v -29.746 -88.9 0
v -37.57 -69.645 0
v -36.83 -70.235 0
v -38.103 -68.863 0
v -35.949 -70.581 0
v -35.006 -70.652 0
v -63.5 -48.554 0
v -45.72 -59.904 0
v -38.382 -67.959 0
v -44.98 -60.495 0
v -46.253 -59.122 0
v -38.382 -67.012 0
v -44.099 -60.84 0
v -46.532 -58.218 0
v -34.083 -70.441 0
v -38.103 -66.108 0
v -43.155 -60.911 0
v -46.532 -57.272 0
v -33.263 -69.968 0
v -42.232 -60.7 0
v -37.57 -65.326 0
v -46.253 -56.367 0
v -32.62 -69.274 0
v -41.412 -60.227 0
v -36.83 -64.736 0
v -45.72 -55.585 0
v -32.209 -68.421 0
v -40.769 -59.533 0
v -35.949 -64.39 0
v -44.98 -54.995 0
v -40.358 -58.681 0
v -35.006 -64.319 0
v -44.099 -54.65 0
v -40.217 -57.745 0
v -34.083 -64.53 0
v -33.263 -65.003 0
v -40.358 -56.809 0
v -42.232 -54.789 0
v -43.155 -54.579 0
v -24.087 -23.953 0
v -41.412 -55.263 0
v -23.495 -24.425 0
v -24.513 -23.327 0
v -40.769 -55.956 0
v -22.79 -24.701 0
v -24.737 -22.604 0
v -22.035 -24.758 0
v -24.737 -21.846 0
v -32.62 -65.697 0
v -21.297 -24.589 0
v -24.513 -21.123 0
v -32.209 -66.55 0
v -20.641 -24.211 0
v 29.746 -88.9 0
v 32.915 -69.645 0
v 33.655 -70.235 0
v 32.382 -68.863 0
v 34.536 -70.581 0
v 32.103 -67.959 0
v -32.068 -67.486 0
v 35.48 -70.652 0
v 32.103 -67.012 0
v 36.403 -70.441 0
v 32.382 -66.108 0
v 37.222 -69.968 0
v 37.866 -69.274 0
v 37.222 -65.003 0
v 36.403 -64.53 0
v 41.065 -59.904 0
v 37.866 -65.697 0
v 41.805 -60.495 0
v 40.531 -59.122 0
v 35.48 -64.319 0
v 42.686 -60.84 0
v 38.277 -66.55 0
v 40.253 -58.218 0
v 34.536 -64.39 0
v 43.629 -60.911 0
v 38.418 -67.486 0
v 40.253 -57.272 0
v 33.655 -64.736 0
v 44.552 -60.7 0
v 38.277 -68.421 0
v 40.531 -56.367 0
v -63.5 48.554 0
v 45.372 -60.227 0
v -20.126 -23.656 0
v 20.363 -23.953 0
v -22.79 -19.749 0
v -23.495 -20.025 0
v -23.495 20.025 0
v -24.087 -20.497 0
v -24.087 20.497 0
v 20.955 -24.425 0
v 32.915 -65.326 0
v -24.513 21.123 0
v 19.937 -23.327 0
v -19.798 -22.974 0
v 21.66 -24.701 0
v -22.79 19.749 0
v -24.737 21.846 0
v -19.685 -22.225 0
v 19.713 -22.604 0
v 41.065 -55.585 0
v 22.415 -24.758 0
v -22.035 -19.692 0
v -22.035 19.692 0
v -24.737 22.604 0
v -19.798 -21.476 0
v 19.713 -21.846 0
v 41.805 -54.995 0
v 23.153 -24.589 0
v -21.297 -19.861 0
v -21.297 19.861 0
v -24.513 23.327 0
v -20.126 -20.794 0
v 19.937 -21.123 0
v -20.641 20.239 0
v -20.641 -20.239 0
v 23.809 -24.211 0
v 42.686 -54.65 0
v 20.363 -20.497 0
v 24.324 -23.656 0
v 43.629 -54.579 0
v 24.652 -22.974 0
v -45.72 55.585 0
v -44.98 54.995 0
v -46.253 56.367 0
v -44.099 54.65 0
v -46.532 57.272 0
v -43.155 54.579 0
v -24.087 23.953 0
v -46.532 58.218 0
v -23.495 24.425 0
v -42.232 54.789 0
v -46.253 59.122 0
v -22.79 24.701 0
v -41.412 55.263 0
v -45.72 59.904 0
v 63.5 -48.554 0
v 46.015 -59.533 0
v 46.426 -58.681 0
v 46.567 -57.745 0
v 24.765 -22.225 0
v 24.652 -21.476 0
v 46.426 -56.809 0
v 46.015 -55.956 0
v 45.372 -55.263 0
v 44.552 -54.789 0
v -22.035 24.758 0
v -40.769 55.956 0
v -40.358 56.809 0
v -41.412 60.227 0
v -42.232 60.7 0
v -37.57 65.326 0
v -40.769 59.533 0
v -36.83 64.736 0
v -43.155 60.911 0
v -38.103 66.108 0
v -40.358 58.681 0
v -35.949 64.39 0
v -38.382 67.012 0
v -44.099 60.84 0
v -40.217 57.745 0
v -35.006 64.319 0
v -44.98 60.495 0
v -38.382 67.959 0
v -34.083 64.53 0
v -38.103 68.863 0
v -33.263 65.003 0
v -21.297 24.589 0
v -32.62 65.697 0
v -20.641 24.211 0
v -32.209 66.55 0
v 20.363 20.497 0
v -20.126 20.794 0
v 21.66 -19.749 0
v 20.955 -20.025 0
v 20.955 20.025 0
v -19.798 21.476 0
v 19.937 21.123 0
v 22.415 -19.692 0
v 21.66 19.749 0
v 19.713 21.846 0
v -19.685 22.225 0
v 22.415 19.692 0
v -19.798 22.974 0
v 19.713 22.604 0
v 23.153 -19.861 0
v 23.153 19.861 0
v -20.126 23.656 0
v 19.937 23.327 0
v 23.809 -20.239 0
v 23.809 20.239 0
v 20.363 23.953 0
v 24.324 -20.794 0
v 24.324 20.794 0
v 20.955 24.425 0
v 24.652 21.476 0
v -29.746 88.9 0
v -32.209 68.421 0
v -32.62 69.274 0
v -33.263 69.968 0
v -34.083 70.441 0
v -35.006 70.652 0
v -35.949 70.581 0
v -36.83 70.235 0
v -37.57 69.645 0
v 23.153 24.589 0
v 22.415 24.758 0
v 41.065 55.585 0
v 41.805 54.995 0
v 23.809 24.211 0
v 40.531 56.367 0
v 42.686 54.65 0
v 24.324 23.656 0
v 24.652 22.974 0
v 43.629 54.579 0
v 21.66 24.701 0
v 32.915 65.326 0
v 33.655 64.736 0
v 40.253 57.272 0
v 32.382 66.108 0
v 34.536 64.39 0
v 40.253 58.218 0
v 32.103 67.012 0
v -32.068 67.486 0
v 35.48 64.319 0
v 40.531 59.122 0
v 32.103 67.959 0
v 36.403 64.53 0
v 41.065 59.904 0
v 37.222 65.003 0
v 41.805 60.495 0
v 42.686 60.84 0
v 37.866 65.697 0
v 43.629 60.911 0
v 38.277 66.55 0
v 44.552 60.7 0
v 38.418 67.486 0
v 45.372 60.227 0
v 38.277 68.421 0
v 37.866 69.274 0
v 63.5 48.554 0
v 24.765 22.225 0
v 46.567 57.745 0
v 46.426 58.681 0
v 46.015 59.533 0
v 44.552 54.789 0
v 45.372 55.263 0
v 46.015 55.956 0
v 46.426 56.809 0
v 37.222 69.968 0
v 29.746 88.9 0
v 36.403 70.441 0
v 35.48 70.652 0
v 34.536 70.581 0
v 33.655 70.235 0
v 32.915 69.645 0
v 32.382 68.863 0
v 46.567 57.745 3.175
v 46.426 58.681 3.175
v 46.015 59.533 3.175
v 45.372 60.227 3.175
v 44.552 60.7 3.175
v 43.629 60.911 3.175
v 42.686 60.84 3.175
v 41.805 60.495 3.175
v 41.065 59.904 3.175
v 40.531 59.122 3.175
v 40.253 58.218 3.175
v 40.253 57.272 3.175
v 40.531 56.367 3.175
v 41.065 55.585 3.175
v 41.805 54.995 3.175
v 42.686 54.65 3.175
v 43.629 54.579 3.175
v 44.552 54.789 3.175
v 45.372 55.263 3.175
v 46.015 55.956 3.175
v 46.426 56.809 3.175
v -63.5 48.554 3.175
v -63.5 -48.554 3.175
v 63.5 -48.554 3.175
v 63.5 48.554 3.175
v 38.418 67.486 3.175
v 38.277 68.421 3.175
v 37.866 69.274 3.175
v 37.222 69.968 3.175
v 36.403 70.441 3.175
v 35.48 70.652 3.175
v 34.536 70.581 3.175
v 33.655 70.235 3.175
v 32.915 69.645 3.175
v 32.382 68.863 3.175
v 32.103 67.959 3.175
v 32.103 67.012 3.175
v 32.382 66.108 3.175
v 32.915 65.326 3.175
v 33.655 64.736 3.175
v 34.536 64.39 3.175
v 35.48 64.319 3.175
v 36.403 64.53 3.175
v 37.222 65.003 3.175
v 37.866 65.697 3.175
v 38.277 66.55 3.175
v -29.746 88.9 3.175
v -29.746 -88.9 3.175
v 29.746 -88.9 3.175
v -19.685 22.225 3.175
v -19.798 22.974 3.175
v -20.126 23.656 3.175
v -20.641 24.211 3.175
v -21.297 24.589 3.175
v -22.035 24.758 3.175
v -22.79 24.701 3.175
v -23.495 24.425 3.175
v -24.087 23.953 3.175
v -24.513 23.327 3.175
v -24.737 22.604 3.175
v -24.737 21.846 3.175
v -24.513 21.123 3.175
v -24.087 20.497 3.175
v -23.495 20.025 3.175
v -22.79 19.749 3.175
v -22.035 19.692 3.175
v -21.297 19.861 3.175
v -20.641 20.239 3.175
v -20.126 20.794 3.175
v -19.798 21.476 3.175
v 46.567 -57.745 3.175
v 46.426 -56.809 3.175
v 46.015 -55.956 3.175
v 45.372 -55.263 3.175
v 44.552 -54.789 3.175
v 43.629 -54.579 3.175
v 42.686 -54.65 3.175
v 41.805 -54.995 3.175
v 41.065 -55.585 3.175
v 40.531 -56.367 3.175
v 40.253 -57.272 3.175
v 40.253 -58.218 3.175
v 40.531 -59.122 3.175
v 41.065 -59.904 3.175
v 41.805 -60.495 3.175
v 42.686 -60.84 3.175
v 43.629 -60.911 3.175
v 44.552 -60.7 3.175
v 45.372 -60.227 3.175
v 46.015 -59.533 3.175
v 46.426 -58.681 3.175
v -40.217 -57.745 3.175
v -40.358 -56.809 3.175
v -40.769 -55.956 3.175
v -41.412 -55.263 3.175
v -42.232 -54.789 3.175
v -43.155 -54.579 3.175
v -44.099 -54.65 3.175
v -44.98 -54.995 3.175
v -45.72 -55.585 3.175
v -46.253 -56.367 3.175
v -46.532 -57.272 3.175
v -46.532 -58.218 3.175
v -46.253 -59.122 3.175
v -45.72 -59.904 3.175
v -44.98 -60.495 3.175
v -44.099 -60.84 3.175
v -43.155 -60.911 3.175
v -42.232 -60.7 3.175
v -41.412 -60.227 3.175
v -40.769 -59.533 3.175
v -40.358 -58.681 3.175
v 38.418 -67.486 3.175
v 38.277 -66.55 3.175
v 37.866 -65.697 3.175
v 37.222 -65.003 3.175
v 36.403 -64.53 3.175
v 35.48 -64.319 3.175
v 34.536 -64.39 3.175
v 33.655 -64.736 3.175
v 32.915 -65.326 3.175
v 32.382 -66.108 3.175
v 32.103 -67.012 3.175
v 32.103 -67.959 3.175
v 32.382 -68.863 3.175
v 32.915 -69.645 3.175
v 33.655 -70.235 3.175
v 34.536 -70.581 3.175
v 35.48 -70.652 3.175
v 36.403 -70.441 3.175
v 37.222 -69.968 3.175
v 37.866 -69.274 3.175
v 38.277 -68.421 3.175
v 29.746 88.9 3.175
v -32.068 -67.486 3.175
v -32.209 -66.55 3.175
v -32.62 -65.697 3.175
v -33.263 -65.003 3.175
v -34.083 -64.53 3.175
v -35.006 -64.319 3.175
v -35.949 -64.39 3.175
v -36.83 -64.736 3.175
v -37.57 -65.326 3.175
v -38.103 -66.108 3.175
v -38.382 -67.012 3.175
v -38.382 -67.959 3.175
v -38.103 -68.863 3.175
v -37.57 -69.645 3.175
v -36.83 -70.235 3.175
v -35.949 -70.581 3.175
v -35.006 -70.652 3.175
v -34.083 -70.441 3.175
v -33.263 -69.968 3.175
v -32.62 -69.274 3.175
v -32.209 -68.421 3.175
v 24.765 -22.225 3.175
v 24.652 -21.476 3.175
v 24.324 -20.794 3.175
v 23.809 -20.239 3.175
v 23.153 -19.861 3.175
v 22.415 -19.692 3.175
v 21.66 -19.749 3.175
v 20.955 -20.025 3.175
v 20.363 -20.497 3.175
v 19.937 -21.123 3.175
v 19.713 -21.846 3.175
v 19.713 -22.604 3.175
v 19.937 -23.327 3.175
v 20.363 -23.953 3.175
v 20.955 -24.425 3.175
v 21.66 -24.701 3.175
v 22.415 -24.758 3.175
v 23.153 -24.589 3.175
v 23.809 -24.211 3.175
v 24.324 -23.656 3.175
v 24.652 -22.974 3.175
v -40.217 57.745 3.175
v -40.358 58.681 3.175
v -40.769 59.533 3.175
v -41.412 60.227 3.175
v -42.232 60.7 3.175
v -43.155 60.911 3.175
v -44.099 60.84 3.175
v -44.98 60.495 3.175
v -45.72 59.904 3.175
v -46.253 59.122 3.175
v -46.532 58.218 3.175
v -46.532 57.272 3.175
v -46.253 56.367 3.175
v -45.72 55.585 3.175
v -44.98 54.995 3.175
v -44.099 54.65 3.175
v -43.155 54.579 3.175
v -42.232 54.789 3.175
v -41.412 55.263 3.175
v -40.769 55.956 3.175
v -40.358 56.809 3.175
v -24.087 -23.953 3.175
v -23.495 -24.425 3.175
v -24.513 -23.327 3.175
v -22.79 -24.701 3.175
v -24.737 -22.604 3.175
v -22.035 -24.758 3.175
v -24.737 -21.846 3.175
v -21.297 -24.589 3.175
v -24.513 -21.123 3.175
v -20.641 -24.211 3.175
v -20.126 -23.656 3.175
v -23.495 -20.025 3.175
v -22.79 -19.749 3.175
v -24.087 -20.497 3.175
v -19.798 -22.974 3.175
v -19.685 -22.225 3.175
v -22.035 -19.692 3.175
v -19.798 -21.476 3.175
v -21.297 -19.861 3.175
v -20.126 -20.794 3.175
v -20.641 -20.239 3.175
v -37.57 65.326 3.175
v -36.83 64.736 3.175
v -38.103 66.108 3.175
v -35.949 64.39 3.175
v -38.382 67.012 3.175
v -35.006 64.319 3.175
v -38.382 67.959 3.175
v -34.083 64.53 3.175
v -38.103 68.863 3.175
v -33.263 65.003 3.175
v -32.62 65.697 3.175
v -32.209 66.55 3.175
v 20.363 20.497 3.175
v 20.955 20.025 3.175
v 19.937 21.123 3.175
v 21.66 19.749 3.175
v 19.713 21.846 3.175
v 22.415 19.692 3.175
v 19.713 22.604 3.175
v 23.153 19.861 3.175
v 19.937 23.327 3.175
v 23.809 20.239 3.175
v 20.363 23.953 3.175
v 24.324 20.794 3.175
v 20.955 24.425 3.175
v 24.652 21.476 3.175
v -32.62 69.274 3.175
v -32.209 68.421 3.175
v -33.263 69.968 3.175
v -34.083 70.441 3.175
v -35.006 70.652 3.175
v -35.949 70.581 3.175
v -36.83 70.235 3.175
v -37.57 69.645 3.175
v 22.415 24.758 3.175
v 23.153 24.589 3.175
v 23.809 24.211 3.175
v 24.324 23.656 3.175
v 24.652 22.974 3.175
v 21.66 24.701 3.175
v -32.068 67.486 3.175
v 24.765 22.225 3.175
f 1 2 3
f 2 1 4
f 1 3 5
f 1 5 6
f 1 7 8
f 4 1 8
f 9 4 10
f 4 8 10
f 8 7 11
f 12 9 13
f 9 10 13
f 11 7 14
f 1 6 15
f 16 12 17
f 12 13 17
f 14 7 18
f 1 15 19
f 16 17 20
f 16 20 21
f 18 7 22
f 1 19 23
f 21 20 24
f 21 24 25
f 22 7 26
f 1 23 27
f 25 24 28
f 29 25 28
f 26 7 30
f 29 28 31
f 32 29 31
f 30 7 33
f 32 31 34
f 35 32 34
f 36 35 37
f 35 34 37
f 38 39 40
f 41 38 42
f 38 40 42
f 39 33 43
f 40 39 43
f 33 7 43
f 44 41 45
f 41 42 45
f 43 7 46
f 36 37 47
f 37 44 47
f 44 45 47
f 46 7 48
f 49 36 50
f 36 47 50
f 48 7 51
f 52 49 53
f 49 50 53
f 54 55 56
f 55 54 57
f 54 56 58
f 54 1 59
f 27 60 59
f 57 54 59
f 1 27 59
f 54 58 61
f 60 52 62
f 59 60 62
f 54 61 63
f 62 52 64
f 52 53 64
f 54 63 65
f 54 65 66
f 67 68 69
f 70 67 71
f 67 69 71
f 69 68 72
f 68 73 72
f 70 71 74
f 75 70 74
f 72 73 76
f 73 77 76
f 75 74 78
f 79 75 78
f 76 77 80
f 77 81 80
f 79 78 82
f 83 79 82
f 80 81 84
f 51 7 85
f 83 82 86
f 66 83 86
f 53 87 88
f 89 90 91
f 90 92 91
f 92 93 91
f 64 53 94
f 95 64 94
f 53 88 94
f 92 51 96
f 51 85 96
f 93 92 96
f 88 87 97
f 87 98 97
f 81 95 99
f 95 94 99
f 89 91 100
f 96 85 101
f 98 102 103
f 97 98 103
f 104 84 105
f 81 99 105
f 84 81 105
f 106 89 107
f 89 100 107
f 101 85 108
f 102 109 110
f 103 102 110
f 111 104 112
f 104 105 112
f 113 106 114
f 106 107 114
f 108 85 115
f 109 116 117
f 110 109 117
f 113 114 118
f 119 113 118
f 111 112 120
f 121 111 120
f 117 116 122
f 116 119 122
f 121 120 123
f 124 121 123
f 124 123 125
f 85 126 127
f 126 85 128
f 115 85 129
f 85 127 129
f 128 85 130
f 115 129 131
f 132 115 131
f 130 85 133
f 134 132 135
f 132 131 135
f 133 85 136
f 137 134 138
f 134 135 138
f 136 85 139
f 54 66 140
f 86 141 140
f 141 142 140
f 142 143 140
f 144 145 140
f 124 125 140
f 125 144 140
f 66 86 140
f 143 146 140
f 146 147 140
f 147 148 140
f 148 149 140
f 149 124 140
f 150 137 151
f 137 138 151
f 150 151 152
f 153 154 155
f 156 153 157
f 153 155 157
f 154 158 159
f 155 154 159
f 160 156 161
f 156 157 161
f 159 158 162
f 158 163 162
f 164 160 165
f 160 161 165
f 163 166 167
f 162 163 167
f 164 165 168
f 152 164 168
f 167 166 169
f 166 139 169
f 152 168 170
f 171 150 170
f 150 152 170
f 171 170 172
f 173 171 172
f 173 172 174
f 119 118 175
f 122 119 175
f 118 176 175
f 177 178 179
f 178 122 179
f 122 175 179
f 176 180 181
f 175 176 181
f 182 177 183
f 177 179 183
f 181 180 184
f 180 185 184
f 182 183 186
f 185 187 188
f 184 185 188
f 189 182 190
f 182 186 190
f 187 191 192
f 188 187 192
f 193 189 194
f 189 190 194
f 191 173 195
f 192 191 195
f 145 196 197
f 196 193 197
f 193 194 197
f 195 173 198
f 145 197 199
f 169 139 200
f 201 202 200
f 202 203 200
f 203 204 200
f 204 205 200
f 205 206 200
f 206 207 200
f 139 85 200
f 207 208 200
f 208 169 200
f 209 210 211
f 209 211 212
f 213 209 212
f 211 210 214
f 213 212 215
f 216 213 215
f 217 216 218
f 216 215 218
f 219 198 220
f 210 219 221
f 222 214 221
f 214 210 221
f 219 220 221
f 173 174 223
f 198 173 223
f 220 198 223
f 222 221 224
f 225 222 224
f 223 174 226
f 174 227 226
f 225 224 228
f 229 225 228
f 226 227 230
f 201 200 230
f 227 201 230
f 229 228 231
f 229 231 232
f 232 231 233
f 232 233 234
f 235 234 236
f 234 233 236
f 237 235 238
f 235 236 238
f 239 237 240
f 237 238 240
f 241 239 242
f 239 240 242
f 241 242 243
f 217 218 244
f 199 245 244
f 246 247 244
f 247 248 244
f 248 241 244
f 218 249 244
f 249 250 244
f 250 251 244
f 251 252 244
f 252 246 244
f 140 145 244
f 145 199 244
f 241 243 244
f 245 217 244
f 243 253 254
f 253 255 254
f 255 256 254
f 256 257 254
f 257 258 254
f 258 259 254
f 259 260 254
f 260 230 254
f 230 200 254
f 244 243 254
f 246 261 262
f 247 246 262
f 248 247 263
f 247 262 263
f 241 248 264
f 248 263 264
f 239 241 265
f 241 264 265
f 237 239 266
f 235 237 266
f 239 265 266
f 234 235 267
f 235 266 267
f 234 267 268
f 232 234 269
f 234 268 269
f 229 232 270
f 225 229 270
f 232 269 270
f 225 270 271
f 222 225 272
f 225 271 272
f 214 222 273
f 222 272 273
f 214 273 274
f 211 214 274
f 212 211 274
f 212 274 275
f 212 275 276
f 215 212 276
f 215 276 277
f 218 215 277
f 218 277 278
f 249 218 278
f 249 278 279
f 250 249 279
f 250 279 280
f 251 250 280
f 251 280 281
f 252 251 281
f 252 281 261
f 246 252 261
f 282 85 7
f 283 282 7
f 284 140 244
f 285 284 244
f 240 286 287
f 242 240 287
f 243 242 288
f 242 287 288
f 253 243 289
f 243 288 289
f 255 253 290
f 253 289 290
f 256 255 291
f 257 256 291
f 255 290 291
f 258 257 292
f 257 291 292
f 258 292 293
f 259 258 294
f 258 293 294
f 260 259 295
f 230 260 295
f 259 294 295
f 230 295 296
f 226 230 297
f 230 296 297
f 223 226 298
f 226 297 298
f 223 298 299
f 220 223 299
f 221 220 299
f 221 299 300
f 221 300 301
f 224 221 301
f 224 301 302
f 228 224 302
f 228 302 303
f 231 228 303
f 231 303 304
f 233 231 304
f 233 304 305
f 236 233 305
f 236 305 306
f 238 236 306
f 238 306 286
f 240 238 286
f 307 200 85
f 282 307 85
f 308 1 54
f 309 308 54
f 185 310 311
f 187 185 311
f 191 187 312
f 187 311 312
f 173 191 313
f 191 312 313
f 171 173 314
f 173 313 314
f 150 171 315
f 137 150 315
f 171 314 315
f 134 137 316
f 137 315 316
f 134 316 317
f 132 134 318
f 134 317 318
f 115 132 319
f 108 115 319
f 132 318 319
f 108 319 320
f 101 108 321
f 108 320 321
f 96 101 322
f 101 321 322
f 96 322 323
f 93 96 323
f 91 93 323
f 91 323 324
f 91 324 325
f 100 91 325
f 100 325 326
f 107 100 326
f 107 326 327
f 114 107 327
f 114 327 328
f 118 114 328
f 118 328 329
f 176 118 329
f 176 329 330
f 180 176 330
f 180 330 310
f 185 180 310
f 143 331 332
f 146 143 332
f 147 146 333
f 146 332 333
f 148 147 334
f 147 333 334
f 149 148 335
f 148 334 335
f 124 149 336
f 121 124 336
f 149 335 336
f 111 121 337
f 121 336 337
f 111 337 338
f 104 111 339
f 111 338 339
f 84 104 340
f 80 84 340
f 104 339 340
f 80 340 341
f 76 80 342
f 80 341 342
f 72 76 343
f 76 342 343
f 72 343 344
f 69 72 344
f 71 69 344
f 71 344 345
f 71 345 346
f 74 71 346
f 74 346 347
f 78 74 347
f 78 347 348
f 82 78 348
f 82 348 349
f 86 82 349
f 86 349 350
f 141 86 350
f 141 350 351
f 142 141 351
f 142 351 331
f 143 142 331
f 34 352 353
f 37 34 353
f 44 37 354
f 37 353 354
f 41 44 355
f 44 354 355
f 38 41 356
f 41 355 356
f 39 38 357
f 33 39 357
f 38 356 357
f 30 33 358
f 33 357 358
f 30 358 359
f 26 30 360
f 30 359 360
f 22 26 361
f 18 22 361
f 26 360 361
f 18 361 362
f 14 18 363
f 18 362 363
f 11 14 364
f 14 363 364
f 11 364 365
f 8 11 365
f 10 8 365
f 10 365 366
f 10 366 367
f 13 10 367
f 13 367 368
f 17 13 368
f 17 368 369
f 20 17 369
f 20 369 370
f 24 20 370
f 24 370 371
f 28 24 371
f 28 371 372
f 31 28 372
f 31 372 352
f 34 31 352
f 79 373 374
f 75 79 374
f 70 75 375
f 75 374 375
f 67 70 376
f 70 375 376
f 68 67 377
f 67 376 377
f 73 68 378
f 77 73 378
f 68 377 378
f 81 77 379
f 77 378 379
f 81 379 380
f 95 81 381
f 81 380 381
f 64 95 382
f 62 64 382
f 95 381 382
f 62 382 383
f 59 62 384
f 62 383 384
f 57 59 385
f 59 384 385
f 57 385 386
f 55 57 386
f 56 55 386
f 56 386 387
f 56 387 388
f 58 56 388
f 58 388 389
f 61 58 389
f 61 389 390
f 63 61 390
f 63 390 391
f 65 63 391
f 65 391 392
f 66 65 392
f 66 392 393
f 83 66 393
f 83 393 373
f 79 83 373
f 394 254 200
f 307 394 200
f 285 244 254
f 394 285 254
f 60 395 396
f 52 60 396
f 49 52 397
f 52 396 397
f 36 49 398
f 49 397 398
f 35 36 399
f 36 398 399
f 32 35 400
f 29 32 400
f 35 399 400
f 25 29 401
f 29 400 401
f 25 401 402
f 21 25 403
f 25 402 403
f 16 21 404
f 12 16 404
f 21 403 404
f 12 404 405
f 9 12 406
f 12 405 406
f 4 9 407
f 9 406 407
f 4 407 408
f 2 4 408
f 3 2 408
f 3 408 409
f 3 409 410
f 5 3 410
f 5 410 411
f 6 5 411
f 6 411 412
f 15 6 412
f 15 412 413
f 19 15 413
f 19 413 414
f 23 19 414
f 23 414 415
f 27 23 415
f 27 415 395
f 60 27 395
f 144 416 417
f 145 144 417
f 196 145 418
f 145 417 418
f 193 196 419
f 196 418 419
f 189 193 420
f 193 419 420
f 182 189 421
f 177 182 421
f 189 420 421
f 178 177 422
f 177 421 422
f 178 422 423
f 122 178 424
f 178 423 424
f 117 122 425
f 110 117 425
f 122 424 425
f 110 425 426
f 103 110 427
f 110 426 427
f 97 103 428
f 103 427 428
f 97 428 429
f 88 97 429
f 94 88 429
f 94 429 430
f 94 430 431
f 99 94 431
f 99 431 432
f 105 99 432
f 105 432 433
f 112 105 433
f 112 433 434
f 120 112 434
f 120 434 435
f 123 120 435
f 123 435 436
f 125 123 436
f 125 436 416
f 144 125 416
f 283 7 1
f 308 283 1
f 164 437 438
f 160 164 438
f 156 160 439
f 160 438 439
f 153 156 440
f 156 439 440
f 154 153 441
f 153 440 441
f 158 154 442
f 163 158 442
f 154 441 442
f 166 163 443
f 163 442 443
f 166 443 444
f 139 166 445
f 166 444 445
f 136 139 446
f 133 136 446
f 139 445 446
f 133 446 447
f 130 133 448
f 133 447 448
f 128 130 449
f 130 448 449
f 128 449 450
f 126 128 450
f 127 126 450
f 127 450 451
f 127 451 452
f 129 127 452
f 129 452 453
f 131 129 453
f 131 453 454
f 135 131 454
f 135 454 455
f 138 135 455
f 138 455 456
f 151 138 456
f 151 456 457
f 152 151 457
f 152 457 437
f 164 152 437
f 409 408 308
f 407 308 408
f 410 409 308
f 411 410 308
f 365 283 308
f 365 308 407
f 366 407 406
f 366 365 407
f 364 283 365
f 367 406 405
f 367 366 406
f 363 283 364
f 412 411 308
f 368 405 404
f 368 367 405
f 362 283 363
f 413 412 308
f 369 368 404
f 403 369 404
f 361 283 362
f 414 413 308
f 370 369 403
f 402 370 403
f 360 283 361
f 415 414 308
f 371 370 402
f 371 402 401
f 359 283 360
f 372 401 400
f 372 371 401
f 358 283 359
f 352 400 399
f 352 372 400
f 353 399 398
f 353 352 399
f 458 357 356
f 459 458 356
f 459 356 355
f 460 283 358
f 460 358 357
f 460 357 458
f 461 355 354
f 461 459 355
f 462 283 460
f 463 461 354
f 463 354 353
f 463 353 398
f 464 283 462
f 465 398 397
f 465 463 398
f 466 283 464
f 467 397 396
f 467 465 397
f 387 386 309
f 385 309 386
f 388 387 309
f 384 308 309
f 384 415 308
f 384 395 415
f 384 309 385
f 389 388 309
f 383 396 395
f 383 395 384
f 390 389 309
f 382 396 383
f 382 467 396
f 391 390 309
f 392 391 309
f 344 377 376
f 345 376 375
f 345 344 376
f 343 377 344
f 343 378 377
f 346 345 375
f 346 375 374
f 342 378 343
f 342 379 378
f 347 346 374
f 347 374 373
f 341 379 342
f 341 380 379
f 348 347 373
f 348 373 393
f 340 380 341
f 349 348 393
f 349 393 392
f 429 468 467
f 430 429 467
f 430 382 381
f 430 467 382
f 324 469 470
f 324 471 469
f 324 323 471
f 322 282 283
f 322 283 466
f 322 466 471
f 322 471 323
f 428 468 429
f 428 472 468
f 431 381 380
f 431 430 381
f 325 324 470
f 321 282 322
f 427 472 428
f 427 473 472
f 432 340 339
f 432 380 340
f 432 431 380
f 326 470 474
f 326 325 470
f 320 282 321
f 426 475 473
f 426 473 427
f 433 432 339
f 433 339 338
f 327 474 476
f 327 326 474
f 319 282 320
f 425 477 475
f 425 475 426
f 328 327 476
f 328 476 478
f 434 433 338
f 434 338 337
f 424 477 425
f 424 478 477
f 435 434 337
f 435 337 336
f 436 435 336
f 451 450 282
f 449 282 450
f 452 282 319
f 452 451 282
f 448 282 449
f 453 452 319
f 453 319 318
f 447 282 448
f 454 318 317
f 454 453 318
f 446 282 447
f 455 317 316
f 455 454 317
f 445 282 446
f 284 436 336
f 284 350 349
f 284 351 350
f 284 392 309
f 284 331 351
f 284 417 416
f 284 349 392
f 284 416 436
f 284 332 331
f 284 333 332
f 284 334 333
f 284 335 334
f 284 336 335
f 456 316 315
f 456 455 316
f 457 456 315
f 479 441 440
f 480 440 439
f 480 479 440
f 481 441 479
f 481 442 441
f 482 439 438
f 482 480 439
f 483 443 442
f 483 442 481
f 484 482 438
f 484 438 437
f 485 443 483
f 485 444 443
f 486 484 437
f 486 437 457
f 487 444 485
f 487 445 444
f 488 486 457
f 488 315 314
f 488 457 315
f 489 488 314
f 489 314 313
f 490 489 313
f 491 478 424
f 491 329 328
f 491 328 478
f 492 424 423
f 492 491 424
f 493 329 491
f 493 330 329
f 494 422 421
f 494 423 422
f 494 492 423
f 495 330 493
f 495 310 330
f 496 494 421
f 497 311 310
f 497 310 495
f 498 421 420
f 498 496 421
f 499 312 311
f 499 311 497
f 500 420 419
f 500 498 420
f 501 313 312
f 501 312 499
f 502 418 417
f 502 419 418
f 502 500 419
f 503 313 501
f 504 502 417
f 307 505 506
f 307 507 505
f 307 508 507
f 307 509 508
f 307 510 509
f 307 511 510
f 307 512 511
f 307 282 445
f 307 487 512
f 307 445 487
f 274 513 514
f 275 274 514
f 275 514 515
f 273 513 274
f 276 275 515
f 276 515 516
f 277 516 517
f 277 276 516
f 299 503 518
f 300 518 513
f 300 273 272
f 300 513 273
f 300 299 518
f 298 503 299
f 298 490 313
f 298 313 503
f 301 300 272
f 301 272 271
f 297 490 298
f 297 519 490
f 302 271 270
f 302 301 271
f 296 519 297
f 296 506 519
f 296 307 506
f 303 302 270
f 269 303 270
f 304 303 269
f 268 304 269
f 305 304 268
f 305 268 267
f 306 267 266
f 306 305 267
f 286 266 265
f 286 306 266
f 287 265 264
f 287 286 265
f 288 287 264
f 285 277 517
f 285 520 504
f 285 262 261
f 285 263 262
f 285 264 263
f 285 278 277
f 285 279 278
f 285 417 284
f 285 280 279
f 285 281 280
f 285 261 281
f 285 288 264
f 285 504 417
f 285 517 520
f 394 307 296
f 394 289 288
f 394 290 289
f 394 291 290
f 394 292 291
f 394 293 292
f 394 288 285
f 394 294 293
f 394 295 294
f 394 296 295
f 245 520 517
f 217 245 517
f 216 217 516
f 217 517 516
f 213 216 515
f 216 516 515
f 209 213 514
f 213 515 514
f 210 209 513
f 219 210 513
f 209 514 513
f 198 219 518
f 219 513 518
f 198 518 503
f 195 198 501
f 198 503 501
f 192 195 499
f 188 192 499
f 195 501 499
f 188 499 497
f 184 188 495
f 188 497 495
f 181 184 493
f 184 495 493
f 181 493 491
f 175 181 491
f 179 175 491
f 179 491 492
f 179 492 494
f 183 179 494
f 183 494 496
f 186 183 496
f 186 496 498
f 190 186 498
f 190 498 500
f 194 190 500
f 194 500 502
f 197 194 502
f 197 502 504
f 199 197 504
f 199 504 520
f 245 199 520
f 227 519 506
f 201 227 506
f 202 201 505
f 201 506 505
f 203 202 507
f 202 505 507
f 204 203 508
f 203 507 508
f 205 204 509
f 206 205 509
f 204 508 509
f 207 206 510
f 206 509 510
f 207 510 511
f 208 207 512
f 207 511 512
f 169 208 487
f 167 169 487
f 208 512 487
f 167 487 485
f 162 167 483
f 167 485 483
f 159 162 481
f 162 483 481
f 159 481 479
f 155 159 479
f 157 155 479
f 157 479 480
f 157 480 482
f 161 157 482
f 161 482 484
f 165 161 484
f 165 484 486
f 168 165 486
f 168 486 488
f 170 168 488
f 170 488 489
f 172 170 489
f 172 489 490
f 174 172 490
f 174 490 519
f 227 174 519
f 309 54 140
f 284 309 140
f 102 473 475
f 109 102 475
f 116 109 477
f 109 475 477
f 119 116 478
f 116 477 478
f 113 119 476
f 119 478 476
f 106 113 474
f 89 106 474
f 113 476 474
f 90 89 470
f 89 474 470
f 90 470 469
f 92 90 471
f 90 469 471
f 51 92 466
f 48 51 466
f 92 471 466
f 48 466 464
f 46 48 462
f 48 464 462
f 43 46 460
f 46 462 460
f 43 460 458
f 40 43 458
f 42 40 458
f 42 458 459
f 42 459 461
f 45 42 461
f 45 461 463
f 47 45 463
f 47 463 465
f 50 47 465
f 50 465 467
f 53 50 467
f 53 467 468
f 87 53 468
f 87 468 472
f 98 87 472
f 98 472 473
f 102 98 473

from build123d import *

# Parameters (mm, degrees)
F1_DEPTH = 3.175
F2_R     = 3.175
F3_DEPTH = 25.4
F4_R     = 2.54
F5_DEPTH = 3.176


with BuildPart() as f1:
    # F0 (on Top) → F1 (new body)
    with BuildSketch(Plane.XY):
        Polygon((29.745836, 88.9), (-29.745836, 88.9), (-63.5, 48.554318), (-63.5, -48.554318), (-29.745836, -88.9), (29.745836, -88.9), (63.5, -48.554318), (63.5, 48.554318), align=None)
    extrude(amount=F1_DEPTH)

    # F2 (on face) → F3 (cut)
    with BuildSketch(Plane.XY.offset(3.175)):
        with Locations((-43.392069, 57.744911)):
            Circle(F2_R)
        with Locations((-35.242826, 67.48554)):
            Circle(F2_R)
        with Locations((35.242824, 67.485542)):
            Circle(F2_R)
        with Locations((43.392067, 57.744913)):
            Circle(F2_R)
        with Locations((43.392069, -57.744911)):
            Circle(F2_R)
        with Locations((35.242826, -67.48554)):
            Circle(F2_R)
        with Locations((-35.242826, -67.48554)):
            Circle(F2_R)
        with Locations((-43.392069, -57.744911)):
            Circle(F2_R)
    extrude(amount=-F3_DEPTH, mode=Mode.SUBTRACT)

    # F4 (on face) → F5 (cut, through all)
    with BuildSketch(Plane.XY.offset(3.175)):
        with Locations((-22.225, 22.225)):
            Circle(F4_R)
        with Locations((22.225, 22.225)):
            Circle(F4_R)
        with Locations((-22.225, -22.225)):
            Circle(F4_R)
        with Locations((22.225, -22.225)):
            Circle(F4_R)
    extrude(amount=-F5_DEPTH, mode=Mode.SUBTRACT)


solid = f1.part
